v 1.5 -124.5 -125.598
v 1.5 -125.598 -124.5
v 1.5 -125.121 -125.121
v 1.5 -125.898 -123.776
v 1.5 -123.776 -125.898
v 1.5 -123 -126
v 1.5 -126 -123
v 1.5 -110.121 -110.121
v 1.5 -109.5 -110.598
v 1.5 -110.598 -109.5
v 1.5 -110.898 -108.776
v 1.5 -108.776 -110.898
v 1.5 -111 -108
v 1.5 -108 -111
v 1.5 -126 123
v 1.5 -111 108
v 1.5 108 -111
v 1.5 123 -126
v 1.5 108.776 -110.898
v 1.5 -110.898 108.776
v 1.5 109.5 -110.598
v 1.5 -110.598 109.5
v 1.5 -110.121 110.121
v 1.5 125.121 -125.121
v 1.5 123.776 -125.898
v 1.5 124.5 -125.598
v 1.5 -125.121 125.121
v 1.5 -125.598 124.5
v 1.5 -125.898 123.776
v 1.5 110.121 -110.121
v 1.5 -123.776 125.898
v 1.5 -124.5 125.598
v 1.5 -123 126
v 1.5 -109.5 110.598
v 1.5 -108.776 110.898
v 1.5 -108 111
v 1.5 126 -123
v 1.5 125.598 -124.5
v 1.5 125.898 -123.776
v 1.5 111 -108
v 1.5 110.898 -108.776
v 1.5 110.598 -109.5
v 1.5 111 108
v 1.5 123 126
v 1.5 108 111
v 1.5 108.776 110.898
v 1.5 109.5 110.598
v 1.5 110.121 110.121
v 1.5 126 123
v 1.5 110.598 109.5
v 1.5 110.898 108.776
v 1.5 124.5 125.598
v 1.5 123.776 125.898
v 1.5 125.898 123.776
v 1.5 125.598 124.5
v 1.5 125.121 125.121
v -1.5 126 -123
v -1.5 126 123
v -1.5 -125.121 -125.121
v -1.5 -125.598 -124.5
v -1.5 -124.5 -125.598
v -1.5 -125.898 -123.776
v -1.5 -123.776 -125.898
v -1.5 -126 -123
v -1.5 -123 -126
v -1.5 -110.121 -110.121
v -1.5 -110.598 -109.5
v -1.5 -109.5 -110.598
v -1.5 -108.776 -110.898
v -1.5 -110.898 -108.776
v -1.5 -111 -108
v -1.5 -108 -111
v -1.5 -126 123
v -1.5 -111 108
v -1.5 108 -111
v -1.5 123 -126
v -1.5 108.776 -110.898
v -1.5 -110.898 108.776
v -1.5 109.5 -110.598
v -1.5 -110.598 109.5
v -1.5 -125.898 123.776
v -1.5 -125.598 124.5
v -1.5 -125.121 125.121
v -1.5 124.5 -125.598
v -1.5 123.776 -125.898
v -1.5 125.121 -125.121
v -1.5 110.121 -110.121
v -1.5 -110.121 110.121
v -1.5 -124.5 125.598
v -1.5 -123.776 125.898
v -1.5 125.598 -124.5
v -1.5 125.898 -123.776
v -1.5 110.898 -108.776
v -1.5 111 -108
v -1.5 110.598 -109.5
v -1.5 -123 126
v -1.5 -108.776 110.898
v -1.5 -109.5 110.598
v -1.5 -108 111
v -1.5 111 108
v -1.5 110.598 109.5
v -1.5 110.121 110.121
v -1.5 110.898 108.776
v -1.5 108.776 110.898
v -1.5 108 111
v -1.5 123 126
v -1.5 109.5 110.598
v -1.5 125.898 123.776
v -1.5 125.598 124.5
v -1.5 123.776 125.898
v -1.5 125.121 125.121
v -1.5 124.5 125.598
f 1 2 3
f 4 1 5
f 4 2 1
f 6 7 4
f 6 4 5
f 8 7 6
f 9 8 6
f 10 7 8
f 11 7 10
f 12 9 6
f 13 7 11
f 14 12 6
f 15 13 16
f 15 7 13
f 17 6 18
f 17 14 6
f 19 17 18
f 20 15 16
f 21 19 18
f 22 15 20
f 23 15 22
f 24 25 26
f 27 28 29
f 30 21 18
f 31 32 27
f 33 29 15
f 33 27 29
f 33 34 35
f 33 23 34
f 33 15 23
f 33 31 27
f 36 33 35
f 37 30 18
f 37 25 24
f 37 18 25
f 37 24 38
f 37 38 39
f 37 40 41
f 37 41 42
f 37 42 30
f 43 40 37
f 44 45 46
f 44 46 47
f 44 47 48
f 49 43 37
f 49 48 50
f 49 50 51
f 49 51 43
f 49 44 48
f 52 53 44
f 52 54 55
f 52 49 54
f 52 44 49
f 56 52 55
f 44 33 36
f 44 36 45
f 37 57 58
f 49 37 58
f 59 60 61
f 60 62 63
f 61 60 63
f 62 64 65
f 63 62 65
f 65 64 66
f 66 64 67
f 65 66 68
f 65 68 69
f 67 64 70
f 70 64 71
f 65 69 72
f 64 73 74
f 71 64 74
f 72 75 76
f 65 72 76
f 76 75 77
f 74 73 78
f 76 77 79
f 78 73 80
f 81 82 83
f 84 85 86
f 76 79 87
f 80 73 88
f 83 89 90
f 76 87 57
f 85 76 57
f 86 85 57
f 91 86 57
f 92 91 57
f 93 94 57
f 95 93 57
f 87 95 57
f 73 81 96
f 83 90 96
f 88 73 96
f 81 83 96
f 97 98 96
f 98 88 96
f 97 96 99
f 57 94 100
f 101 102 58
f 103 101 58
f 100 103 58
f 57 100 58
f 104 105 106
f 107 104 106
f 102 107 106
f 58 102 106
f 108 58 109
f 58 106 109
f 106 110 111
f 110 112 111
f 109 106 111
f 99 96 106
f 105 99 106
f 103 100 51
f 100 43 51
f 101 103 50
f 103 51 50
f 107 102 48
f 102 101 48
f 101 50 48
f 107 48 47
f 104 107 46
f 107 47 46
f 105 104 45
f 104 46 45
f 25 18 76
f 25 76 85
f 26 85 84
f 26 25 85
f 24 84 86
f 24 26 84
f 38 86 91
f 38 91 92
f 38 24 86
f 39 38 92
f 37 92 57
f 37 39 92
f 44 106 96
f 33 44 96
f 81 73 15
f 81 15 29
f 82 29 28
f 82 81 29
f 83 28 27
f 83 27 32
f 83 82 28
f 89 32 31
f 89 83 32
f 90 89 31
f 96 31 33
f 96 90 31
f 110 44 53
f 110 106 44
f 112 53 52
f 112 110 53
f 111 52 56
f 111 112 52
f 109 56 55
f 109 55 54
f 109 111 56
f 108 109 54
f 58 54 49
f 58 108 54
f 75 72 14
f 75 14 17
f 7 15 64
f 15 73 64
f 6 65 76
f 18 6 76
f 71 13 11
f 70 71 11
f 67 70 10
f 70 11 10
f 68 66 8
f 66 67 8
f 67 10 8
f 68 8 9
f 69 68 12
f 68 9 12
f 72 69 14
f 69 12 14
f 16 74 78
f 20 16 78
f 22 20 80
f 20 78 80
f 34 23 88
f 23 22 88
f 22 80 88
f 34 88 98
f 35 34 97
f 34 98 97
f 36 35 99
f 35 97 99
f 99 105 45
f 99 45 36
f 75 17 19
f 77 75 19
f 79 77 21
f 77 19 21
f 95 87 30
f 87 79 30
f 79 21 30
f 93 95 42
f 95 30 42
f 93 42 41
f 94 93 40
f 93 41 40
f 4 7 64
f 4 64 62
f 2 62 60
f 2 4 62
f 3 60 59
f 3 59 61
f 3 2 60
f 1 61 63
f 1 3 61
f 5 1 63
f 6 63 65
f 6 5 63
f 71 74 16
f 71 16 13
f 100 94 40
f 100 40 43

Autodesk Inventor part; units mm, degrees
ref_plane "YZ Plane" through (0, 0, 0) normal (1, 0, 0) x (0, 1, 0)
ref_plane "XZ Plane" through (0, 0, 0) normal (0, 1, 0) x (-1, 0, 0)
ref_plane "XY Plane" through (0, 0, 0) normal (0, 0, 1) x (1, 0, 0)
sketch "Skizze1" plane through (0, 0, 0) normal (1, 0, 0) x (0, 1, 0)
  line L0 (-176.4, 0) -> (176.4, 0) projected
  line L1 (0, -176.4) -> (0, 176.4) projected
  line L2 (126, 126) -> (-126, 126)
  line L3 (-126, 126) -> (-126, -126)
  line L4 (-126, -126) -> (126, -126)
  line L5 (126, -126) -> (126, 126)
  line L6 (111, 111) -> (-111, 111)
  line L7 (-111, 111) -> (-111, -111)
  line L8 (-111, -111) -> (111, -111)
  line L9 (111, -111) -> (111, 111)
  point P0 (0, 0)
  dimension "d0" = 252
  dimension "d1" = 252
  dimension "d2" = 222
  dimension "d3" = 222
extrude "Extrusion1" add sketch "Skizze1" along normal mid plane 3 contours L3 L2 L1 L6 L7 L0 | L0 L7 L8 L1 L4 L3 | L2 L5 L0 L9 L6 L1 | L1 L8 L9 L0 L5 L4
fillet "Rundung1" radius 3 4 edges at (0, 126, 126) (0, 126, -126) (0, -126, -126) (0, -126, 126)
fillet "Rundung2" radius 3 4 edges at (0, -111, -111) (0, 111, -111) (0, 111, 111) (0, -111, 111)
properties part number "Frontplatte" material "Stahl"
